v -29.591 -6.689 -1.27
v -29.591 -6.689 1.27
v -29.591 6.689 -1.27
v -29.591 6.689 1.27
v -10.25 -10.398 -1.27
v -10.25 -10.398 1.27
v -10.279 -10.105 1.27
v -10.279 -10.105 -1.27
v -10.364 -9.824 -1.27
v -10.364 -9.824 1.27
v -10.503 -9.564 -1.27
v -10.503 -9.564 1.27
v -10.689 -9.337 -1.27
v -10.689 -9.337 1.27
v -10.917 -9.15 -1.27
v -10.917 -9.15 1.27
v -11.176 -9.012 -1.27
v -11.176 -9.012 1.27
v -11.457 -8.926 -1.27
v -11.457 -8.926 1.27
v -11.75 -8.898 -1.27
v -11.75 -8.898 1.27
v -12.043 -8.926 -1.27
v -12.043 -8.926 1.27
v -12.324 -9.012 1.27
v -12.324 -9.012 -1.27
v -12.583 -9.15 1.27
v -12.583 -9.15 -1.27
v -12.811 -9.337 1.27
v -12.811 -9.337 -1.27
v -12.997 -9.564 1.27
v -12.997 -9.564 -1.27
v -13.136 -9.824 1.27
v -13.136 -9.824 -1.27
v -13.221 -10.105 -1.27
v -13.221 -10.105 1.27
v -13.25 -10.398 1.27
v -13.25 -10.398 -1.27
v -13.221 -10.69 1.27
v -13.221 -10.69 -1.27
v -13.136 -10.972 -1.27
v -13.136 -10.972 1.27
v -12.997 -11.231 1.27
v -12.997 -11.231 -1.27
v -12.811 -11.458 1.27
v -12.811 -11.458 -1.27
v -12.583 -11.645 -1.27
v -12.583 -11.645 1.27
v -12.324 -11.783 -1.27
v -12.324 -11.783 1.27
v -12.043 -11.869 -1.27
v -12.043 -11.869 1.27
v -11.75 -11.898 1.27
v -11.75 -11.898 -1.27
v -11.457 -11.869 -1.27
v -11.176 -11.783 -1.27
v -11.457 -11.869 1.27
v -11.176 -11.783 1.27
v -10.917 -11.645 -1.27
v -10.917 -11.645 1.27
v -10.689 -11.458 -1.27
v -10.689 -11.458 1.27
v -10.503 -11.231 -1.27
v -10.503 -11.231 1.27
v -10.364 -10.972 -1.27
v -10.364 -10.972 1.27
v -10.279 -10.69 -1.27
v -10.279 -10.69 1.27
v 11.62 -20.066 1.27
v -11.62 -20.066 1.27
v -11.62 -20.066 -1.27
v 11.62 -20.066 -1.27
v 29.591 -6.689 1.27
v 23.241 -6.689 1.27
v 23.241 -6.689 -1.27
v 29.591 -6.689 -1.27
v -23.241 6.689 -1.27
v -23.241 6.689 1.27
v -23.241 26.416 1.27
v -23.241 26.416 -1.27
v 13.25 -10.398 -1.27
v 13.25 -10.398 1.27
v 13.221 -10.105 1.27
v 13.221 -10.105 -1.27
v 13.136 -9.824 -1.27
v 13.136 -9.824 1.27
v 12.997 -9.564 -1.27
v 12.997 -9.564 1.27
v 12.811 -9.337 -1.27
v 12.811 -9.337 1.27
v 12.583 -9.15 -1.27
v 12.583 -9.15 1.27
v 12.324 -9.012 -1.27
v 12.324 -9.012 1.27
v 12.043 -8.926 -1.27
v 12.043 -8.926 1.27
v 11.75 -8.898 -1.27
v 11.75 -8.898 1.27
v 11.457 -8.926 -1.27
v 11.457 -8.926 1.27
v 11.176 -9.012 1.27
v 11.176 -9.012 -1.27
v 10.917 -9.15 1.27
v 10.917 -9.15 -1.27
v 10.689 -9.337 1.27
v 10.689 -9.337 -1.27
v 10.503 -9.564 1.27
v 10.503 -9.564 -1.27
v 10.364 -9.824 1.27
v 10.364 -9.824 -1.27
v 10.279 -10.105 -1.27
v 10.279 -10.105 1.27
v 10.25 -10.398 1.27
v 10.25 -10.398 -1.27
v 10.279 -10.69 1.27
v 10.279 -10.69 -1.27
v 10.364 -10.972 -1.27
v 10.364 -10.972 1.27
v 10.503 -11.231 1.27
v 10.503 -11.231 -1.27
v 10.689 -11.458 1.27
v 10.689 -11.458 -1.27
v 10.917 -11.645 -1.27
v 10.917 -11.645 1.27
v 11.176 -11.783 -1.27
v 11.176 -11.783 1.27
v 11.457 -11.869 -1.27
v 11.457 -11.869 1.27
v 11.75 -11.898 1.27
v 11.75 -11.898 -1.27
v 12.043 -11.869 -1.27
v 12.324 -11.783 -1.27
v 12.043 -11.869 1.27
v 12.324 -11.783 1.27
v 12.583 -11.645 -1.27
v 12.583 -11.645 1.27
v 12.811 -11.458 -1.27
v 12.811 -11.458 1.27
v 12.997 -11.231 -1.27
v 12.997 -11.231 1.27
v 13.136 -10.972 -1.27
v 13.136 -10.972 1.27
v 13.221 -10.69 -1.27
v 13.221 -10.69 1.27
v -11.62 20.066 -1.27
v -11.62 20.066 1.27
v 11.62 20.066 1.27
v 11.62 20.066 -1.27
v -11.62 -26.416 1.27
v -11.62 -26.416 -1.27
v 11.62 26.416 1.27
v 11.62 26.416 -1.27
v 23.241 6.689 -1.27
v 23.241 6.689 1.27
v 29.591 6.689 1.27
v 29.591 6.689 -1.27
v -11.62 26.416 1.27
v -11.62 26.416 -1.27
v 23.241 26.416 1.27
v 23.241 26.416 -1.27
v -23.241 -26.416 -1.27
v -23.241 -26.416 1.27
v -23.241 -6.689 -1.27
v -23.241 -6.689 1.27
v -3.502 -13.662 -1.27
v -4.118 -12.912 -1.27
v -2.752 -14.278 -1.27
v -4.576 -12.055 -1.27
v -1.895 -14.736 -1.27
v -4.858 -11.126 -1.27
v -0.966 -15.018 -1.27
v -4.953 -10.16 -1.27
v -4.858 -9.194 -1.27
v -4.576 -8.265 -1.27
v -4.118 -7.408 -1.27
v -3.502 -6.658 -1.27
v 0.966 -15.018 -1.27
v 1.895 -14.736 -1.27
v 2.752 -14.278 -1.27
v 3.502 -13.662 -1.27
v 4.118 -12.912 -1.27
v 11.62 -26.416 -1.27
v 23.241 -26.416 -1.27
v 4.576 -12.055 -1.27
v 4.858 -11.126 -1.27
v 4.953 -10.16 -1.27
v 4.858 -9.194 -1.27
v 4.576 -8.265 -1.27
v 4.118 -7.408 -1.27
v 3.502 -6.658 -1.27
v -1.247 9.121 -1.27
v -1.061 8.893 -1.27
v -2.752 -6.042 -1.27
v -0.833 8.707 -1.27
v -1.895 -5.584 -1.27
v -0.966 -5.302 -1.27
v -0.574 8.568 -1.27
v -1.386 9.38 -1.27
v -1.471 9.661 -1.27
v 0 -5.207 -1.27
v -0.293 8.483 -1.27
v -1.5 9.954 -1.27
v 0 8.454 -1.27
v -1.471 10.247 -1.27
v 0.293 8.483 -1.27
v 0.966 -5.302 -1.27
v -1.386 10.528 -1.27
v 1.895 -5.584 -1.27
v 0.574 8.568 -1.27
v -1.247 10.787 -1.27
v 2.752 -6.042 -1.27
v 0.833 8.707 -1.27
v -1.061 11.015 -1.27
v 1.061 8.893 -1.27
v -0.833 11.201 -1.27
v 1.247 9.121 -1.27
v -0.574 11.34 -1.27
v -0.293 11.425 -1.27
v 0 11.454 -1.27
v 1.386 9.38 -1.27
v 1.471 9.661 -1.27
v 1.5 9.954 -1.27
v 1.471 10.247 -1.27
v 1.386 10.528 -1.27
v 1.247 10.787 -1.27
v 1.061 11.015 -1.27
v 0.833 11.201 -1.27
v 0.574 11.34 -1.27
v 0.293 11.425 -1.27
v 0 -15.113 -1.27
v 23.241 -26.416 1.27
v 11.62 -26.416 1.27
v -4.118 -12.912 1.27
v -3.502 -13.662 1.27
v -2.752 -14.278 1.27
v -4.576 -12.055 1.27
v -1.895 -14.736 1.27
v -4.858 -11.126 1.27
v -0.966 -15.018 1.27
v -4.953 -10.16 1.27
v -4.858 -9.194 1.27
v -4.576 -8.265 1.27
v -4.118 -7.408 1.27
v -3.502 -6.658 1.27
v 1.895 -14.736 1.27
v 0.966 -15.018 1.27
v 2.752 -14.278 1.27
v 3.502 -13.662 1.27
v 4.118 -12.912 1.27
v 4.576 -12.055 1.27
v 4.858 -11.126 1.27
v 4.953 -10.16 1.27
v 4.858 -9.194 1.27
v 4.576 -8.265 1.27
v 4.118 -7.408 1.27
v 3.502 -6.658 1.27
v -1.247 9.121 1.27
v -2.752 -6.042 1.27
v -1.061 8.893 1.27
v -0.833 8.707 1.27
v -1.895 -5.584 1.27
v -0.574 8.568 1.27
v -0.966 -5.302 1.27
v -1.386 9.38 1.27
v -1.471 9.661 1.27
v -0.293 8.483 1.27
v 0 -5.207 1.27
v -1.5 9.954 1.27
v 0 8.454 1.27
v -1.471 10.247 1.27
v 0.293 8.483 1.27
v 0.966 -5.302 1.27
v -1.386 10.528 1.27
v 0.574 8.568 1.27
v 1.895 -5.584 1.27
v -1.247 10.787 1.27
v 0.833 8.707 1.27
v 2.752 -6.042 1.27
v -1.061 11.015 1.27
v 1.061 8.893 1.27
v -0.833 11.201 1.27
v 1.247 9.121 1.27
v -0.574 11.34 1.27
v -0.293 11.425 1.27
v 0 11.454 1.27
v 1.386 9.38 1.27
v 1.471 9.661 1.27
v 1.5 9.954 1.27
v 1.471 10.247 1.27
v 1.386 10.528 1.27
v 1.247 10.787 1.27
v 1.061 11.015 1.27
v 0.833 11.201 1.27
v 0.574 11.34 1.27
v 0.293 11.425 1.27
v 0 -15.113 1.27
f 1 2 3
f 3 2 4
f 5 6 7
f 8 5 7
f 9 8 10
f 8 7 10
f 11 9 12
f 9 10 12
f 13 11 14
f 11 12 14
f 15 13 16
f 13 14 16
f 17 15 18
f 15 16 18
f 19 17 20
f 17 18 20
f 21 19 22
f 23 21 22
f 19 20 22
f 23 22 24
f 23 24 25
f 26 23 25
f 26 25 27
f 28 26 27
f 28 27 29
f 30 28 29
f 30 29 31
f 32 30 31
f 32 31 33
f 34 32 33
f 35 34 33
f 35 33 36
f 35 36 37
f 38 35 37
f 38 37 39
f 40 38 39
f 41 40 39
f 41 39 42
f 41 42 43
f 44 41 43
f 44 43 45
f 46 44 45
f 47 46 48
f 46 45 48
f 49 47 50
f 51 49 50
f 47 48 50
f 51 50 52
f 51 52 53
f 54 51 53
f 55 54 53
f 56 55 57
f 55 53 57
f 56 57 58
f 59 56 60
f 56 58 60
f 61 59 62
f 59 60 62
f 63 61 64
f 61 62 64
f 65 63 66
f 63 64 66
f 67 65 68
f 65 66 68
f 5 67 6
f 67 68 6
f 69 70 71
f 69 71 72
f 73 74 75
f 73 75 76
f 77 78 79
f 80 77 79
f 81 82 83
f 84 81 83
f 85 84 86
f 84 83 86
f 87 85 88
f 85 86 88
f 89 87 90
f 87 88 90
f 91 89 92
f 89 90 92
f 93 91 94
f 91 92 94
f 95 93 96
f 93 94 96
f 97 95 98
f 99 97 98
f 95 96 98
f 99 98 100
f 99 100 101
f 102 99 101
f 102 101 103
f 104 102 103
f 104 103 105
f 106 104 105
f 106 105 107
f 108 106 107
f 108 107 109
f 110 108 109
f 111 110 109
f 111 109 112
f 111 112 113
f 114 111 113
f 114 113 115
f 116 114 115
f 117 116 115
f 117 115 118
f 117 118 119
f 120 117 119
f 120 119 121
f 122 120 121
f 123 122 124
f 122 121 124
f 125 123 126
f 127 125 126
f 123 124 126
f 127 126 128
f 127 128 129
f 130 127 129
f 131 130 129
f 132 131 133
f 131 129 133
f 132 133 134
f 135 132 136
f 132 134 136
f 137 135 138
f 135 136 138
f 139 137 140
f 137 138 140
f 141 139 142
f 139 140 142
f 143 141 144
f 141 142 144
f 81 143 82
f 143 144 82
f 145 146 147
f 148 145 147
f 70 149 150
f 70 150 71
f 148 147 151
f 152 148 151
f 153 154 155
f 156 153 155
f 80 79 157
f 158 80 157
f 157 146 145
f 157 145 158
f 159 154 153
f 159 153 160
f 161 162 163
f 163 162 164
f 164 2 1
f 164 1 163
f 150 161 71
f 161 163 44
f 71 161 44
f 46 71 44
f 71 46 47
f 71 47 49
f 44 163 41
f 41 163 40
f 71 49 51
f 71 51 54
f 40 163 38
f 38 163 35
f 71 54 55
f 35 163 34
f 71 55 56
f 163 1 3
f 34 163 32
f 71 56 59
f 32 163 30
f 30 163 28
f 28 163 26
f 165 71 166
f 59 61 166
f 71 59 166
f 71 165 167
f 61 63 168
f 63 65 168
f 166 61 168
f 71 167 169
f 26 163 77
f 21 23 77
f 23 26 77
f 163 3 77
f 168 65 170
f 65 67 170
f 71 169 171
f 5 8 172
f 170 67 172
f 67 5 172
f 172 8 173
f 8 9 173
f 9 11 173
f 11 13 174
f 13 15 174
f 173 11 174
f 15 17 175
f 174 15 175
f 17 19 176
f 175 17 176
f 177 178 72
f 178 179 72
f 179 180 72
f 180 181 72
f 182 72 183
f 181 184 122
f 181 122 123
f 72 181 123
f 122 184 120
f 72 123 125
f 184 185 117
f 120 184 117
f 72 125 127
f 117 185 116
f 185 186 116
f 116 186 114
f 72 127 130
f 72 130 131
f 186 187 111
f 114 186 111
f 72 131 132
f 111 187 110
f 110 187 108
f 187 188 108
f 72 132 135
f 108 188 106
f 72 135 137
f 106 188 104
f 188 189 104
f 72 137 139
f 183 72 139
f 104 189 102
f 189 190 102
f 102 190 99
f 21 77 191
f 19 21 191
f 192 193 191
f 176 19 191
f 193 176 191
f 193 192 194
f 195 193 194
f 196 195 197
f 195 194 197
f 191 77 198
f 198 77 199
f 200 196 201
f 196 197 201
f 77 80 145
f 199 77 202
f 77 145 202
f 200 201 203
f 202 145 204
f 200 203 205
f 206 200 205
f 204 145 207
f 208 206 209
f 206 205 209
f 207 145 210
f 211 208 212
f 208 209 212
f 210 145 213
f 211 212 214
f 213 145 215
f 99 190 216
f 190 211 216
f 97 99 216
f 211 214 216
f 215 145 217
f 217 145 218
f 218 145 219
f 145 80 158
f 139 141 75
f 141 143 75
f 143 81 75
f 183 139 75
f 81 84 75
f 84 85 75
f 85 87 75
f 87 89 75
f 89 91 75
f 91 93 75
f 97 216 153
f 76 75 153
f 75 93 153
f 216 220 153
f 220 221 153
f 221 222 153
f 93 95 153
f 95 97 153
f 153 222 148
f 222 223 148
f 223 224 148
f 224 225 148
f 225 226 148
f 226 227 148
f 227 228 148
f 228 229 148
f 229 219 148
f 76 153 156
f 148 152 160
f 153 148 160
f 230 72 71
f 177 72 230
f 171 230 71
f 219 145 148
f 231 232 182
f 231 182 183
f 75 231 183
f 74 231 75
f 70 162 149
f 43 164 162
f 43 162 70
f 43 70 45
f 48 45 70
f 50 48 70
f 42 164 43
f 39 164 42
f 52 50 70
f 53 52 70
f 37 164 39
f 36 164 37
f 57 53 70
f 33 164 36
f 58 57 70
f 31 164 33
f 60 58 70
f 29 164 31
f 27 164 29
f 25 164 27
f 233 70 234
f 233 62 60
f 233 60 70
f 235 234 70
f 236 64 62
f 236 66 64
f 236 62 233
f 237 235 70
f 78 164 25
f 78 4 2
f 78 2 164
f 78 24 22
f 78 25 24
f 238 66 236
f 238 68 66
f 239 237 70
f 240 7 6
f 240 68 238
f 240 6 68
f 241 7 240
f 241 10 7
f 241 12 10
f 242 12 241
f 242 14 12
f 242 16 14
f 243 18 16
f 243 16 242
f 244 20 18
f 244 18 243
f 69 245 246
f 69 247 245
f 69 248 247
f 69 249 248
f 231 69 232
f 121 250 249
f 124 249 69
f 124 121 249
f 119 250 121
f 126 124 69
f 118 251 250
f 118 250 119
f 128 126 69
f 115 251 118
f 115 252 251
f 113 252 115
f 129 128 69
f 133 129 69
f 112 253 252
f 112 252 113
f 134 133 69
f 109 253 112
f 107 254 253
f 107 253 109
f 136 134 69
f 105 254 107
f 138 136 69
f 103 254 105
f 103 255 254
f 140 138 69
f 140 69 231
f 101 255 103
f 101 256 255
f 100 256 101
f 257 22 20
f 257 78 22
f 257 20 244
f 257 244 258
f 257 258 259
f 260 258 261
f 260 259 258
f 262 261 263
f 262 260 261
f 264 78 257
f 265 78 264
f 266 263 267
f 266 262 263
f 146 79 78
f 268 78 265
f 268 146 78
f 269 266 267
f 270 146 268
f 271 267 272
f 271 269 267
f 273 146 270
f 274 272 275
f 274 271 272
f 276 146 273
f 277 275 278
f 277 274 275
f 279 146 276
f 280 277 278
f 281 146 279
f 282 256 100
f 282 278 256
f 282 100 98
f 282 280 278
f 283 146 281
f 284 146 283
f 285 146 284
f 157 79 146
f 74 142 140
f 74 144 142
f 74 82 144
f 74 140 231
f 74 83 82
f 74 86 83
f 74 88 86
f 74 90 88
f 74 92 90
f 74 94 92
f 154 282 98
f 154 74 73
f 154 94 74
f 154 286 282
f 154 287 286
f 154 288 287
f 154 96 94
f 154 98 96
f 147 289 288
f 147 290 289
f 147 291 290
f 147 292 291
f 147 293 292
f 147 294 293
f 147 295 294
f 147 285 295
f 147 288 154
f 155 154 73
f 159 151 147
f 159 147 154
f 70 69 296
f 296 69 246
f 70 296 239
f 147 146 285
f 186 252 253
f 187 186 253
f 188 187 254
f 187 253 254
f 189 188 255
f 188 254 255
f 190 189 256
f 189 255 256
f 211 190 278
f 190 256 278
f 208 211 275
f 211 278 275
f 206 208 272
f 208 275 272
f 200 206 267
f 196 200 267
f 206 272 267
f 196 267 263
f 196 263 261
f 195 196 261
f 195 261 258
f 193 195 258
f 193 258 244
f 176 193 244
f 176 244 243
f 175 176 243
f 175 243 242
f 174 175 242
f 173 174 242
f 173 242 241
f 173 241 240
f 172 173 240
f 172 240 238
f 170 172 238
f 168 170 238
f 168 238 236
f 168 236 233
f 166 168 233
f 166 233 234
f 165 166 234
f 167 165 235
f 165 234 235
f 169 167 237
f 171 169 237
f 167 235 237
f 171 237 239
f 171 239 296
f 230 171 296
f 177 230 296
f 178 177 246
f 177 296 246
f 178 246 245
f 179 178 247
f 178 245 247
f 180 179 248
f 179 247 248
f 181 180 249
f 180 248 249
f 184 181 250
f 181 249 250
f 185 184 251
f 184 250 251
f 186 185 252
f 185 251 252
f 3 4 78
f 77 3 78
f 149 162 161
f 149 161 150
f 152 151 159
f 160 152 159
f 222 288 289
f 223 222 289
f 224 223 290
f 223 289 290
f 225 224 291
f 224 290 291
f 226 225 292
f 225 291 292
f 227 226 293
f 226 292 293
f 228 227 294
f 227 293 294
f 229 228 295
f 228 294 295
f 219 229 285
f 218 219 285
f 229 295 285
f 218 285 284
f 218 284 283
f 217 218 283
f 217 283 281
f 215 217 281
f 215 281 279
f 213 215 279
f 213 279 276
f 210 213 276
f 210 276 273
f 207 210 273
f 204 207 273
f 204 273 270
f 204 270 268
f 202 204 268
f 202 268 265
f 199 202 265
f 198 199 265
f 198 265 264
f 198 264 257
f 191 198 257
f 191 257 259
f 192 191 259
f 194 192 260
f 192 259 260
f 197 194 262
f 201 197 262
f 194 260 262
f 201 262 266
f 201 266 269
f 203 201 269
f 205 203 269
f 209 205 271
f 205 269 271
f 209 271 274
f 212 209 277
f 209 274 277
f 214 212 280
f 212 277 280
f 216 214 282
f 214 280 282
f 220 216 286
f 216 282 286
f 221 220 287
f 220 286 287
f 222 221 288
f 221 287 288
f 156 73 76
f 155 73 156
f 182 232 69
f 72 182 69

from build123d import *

# Parameters (mm, degrees)
SKETCH1_W           = 46.482
SKETCH1_H           = 40.132
BOSS_EXTRUDE1_DEPTH = 1.27
SKETCH2_W           = 11.6205
SKETCH2_H           = 6.35
SKETCH2_W_2         = 6.35
SKETCH2_H_2         = 13.377333334
BOSS_EXTRUDE2_DEPTH = 2.54
SKETCH3_R           = 1.5
SKETCH3_R_2         = 4.953
CUT_EXTRUDE1_DEPTH  = 3.54


with BuildPart() as part:
    # Sketch1 → Boss-Extrude1 (new body, symmetric)
    with BuildSketch(Plane.XY):
        Rectangle(SKETCH1_W, SKETCH1_H)
    extrude(amount=BOSS_EXTRUDE1_DEPTH, both=True)

    # Sketch2 → Boss-Extrude2 (add, through all)
    with BuildSketch(Plane.XY.offset(1.27)):
        with Locations((-17.43075, 23.241)):
            Rectangle(SKETCH2_W, SKETCH2_H)
        with Locations((17.43075, 23.241)):
            Rectangle(SKETCH2_W, SKETCH2_H)
        with Locations((-26.416, 0)):
            Rectangle(SKETCH2_W_2, SKETCH2_H_2)
        with Locations((26.416, 0)):
            Rectangle(SKETCH2_W_2, SKETCH2_H_2)
        with Locations((-17.43075, -23.241)):
            Rectangle(SKETCH2_W, SKETCH2_H)
        with Locations((17.43075, -23.241)):
            Rectangle(SKETCH2_W, SKETCH2_H)
    extrude(amount=-BOSS_EXTRUDE2_DEPTH)

    # Sketch3 → Cut-Extrude1 (cut, through all)
    with BuildSketch(Plane.XY.offset(1.27)):
        with Locations((0, 9.954)):
            Circle(SKETCH3_R)
        with Locations((0, -10.16)):
            Circle(SKETCH3_R_2)
        with Locations((-11.75, -10.397596989)):
            Circle(SKETCH3_R)
        with Locations((11.75, -10.397596989)):
            Circle(SKETCH3_R)
    extrude(amount=-CUT_EXTRUDE1_DEPTH, mode=Mode.SUBTRACT)


solid = part.part
